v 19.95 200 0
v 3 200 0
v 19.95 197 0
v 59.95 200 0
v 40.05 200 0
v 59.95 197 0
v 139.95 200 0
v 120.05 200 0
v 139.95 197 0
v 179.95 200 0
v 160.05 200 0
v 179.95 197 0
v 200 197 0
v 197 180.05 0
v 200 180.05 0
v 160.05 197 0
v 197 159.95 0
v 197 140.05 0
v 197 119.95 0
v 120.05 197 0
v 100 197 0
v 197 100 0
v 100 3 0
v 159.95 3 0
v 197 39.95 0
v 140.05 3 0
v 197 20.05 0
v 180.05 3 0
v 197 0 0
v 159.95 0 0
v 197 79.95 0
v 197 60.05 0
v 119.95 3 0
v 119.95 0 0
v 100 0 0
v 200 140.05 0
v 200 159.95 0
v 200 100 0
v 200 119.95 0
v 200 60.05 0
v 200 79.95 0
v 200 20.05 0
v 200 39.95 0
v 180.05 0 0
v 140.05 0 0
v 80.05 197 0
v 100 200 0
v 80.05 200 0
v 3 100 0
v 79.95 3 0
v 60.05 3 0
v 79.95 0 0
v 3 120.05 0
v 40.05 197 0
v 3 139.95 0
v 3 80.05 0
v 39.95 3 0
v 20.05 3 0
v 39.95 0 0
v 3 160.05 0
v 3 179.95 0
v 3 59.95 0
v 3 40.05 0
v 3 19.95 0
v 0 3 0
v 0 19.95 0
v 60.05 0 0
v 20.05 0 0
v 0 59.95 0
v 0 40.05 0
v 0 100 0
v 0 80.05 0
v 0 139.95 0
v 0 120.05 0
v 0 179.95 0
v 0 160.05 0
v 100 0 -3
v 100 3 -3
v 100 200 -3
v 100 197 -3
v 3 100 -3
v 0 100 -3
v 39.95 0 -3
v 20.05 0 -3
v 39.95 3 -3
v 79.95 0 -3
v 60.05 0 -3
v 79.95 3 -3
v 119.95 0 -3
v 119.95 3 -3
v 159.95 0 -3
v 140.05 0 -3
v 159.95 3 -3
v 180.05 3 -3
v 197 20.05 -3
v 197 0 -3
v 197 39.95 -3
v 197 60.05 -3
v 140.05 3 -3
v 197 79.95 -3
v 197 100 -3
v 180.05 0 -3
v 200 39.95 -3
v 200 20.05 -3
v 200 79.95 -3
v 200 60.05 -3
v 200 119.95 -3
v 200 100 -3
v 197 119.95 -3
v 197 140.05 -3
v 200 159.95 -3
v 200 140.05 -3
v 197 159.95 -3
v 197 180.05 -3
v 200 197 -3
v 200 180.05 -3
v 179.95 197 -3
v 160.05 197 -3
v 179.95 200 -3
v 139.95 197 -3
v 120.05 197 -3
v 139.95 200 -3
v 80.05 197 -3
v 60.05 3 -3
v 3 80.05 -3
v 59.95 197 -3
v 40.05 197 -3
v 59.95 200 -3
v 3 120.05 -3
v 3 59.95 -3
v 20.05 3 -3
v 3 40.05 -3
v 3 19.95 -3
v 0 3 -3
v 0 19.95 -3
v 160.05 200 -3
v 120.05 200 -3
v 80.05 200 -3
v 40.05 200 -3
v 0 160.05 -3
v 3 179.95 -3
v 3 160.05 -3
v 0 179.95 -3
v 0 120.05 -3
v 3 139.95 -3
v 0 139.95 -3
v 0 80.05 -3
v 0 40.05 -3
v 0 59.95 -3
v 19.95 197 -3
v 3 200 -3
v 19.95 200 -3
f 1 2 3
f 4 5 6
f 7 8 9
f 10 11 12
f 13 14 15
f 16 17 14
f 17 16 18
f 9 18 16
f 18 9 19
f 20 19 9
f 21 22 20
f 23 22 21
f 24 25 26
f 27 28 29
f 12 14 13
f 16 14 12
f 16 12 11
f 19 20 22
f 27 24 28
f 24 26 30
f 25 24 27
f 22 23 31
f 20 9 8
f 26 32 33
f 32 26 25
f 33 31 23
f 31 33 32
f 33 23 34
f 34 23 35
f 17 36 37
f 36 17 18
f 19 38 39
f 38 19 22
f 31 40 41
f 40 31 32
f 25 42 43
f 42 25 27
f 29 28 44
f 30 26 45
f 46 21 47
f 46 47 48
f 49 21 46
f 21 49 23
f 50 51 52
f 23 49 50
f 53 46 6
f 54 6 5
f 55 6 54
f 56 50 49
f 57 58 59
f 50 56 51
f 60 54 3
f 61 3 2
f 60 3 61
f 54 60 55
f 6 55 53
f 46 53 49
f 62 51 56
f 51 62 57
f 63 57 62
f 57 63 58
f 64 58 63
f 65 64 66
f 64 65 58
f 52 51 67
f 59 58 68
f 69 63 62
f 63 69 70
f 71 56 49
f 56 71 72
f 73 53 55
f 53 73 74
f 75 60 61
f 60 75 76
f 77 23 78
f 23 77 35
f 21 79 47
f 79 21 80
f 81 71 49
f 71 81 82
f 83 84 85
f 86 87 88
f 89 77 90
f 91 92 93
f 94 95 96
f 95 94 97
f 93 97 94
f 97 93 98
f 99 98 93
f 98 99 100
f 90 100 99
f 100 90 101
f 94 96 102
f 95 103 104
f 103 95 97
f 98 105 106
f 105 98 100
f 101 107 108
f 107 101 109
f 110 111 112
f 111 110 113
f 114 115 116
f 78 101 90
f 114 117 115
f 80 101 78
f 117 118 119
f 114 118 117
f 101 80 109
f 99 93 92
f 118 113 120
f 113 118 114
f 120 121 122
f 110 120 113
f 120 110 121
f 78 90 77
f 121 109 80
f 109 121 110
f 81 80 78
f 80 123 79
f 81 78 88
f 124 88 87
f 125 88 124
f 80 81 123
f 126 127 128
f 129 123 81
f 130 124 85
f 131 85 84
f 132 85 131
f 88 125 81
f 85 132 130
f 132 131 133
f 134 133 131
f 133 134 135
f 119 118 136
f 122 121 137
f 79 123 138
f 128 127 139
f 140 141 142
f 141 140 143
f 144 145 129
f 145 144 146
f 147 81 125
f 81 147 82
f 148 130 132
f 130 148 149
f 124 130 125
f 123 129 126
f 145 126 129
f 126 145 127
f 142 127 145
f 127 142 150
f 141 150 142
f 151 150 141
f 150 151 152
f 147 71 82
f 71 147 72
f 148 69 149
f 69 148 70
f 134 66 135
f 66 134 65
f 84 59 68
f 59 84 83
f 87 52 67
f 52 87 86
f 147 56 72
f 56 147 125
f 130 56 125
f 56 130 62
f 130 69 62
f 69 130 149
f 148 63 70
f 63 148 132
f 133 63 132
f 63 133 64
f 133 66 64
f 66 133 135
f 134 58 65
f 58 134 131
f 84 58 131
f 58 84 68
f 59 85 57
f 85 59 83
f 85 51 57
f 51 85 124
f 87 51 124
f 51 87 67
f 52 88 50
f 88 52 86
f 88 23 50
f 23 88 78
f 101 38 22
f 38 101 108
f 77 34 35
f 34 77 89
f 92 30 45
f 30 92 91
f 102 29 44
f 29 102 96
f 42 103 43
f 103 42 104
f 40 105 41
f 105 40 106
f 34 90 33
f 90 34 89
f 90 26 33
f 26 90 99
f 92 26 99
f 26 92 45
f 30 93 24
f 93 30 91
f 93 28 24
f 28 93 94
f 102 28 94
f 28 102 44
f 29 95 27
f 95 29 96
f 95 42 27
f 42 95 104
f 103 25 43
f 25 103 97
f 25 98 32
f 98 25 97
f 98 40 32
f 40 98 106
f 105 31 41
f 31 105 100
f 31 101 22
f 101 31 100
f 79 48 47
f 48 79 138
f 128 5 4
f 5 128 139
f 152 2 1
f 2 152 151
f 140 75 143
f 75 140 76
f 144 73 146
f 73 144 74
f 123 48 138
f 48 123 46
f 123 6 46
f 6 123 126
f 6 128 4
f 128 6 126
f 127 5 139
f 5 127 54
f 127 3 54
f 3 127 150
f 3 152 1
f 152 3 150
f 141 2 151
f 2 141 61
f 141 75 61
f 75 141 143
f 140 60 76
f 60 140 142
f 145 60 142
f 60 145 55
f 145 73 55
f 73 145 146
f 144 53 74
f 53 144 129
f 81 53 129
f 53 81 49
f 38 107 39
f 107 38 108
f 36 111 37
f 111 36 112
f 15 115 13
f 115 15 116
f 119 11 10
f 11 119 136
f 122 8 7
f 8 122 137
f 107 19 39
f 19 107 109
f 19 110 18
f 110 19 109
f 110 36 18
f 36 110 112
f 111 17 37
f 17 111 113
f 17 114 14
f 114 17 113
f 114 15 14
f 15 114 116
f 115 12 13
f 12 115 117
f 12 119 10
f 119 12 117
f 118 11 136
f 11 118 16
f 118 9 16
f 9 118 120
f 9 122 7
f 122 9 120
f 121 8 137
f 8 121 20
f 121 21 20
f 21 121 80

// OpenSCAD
model_view = 1;
// 1 == 3d assembled view
// 2 == 2d flat projection for laser cutting
// 3 == 3d parts disasembled

// use model_view = 2, then render (F6),
// then export as e.g. .pdf to get outlines for cutting


// Global variables
material_thickness = 3.00; // material thickness in mm
kerf_thickness = 0.1; // kerf or adjustment to cutouts; this may need to be set differently for different material types or thicknesses
combined_thickness = material_thickness+kerf_thickness; // combined thickness

cube_section_length = 100.00; // mm length of individual cube sections

num_finger_cutouts = 5; //  total connectors per side, use odd numbers

// start modules

sec_len = cube_section_length;

mat_thic = material_thickness;


module finger_cutout(start_index, total_fingers, section_length, thickness, kerf) {
    // Create a 2D finger pattern
    module finger_pattern() {
        for (i = [0 : total_fingers - 1]) {
            if ((i + start_index) % 2 == 0) {
                translate([i * (section_length / total_fingers), 0]) {
                    square([(section_length / total_fingers) + kerf, thickness+kerf], center=false);
                }
            }
        }
    }
    
    // Extrude the 2D pattern to 3D
    linear_extrude(height = thickness + kerf) {
        finger_pattern();
    }
}

module finger_addon(start_index, total_fingers, section_length, thickness, kerf) {
    // Create a 2D finger pattern
    module finger_pattern() {
        for (i = [0 : total_fingers - 1]) {
            if ((i + start_index) % 2 == 0) {
                translate([i * (section_length / total_fingers), 0]) {
                    square([(section_length / total_fingers) -1* kerf, thickness+kerf], center=false);
                }
            }
        }
    }
    
    // Extrude the 2D pattern to 3D
    linear_extrude(height = thickness ) {
        finger_pattern();
    }
}



module flat_section(mat_thic, sec_len, num_finger_cutouts, kerf_thic, color_value, finger_sides) {
    difference() {
        create_colored_square(mat_thic, sec_len, sec_len, color_value);
        
        
                // Calculate the start position to center the fingers
        finger_length = sec_len / num_finger_cutouts;
        start_pos = (sec_len - finger_length * num_finger_cutouts) / 2-kerf_thic/2;
        
        
        

if (finger_sides == 1 || finger_sides == 2 || finger_sides == 3 || finger_sides == 4) {
        // Finger cutouts on one edge
        translate([start_pos, -kerf_thic, -kerf_thic/2]) {
            finger_cutout(0, num_finger_cutouts, sec_len, mat_thic, kerf_thic);
        }
    }

if ( finger_sides == 2 || finger_sides == 3 || finger_sides == 4) {
        // Finger cutouts on the opposite edge
        translate([start_pos, sec_len - mat_thic, -kerf_thic/2]) {
            finger_cutout(0, num_finger_cutouts, sec_len, mat_thic, kerf_thic);
        }
    }

if ( finger_sides == 3 || finger_sides == 4) {
        // Finger cutouts on another edge
        translate([mat_thic, start_pos, -kerf_thic/2]) {
            rotate([0, 0, 90]) {
                finger_cutout(1, num_finger_cutouts, sec_len, mat_thic, kerf_thic);
            }
        }
    }

if (finger_sides == 4) {
        // Finger cutouts on the opposite edge
        translate([sec_len+kerf_thic , start_pos, -kerf_thic/2]) {
            rotate([0, 0, 90]) {
                finger_cutout(1, num_finger_cutouts, sec_len, mat_thic, kerf_thic);
            }
        }
    }
    
    if (finger_sides == 5|| finger_sides == 6|| finger_sides == 7|| finger_sides == 8) {  // alt version of one sided
        // Finger cutouts on the opposite adjacent edge (rotated 90 degrees)
        // Finger cutouts on another edge
        translate([mat_thic, start_pos, -kerf_thic/2]) {
            rotate([0, 0, 90]) {
                finger_cutout(1, num_finger_cutouts, sec_len, mat_thic, kerf_thic);
            }
        }
    }
    
    if (  finger_sides == 6|| finger_sides == 7) { // alt two sided
        // Finger cutouts on the adjacent edge (rotated 90 degrees)
        // Finger cutouts on the opposite edge
        translate([sec_len+kerf_thic , start_pos, -kerf_thic/2]) {
            rotate([0, 0, 90]) {
                finger_cutout(1, num_finger_cutouts, sec_len, mat_thic, kerf_thic);
            }
        }
    }
    
    if ( finger_sides == 7|| finger_sides == 8) { // alt three sides
        // Finger cutouts on the opposite edge
        translate([start_pos, sec_len - mat_thic, -kerf_thic/2]) {
            finger_cutout(0, num_finger_cutouts, sec_len, mat_thic, kerf_thic);
        }
    }
    
    }
}




module single_sec(mat_thic, sec_len, num_finger_cutouts, kerf_thic, color_value) {
    // Bottom face
    flat_section(mat_thic, sec_len, num_finger_cutouts, kerf_thic, color_value,4);
    
    // Top face
    translate([0, 0, sec_len - mat_thic]) {
        flat_section(mat_thic, sec_len, num_finger_cutouts, kerf_thic, color_value,4);
    }
    
    // Front face
    rotate([90, 0, 90]) {
        flat_section(mat_thic, sec_len, num_finger_cutouts, kerf_thic, color_value,4);
    }
    
    // Back face
    rotate([90, 0, 90]) {
        translate([0, 0, sec_len - mat_thic]) {
            flat_section(mat_thic, sec_len, num_finger_cutouts, kerf_thic, color_value,4);
        }
    }
    
    // Left face
    rotate([0, 90, 90]) {
        translate([-sec_len, -sec_len, 0]) {
            flat_section(mat_thic, sec_len, num_finger_cutouts, kerf_thic, color_value,4);
        }
    }
    
    // Right face
    rotate([0, 90, 90]) {
        translate([-sec_len, -sec_len, sec_len - mat_thic]) {
            flat_section(mat_thic, sec_len, num_finger_cutouts, kerf_thic, color_value,4);
        }
    }
}

module create_colored_square(thickness, x, y, color_value) {
    color(color_value, 0.75) {
        create_square(thickness, x, y);
    }
}

module create_square(thickness, x, y) {
        points = [[0,0], [x,0], [x,y], [0,y], [0,0]];
       linear_extrude(height = thickness , center = false)  polygon(points=points);
    
}

module tetris_O_bot(mat_thic, sec_len, num_finger_cutouts, kerf_thic, color_value) {
    // Base
    translate([sec_len*0, sec_len*1, 0])  {
        rotate([0, 180, 180]) {
    flat_section(mat_thic, sec_len, num_finger_cutouts, kerf_thic, color_value,8); }}
    
    // Side 1
        translate([sec_len*1, sec_len*0, 0])  {
    rotate([0, 180, -90]) {
        flat_section(mat_thic, sec_len, num_finger_cutouts, kerf_thic, color_value,8);
    }
}
    
    // Side 2
    translate([sec_len*1 , sec_len*2,0]) {
            rotate([0, 180, 90]) {
        flat_section(mat_thic, sec_len, num_finger_cutouts, kerf_thic, color_value,8);
    }
}
    
    // Top
    translate([sec_len*2 , sec_len*1, 0]) {
        rotate([0, 180, 0]) {
            flat_section(mat_thic, sec_len, num_finger_cutouts, kerf_thic, color_value,8);
        }
    }
}

module tetris_Z_bot(mat_thic, sec_len, num_finger_cutouts, kerf_thic, color_value) {
    // Base
    flat_section(mat_thic, sec_len, num_finger_cutouts, kerf_thic, color_value,3);
    
    // Side 1
        translate([sec_len*1, sec_len*0, 0])  {
    rotate([0, 180, -90]) {
        flat_section(mat_thic, sec_len, num_finger_cutouts, kerf_thic, color_value,8);
    }
}
    
    // Side 2
    translate([sec_len*1 , sec_len,0]) {
            rotate([0, 0, 00]) {
        flat_section(mat_thic, sec_len, num_finger_cutouts, kerf_thic, color_value,8);
    }
}
    
    // Top
    translate([sec_len*2 , sec_len*2, 0]) {
        rotate([0, 0, -90]) {
            flat_section(mat_thic, sec_len, num_finger_cutouts, kerf_thic, color_value,7);
        }
    }
}


module tetris_L_bot(mat_thic, sec_len, num_finger_cutouts, kerf_thic, color_value) {
    // Base
    flat_section(mat_thic, sec_len, num_finger_cutouts, kerf_thic, color_value,3);
    
    // Side 1
        translate([sec_len*2, 0, 0])  {
    rotate([0, 0, 90]) {
        flat_section(mat_thic, sec_len, num_finger_cutouts, kerf_thic, color_value,6);
    }
}
    
    // Side 2
    translate([sec_len*3 , sec_len,0]) {
            rotate([0, 0, 180]) {
        flat_section(mat_thic, sec_len, num_finger_cutouts, kerf_thic, color_value,8);
    }
}
    
    // Top
    translate([sec_len*2 , sec_len*2, 0]) {
        rotate([0, 0, -90]) {
            flat_section(mat_thic, sec_len, num_finger_cutouts, kerf_thic, color_value,3);
        }
    }
}


module tetris_T_bot(mat_thic, sec_len, num_finger_cutouts, kerf_thic, color_value) {
    // Base
    flat_section(mat_thic, sec_len, num_finger_cutouts, kerf_thic, color_value,3);
    
    // Side 1
        translate([sec_len*2, 0, 0])  {
    rotate([0, 0, 90]) {
        flat_section(mat_thic, sec_len, num_finger_cutouts, kerf_thic, color_value,5);
    }
}
    
    // Side 2
    translate([sec_len*3 , sec_len,0]) {
            rotate([0, 0, 180]) {
        flat_section(mat_thic, sec_len, num_finger_cutouts, kerf_thic, color_value,3);
    }
}
    
    // Top
    translate([sec_len , sec_len, 0]) {
        rotate([0, 0, 0]) {
            flat_section(mat_thic, sec_len, num_finger_cutouts, kerf_thic, color_value,7);
        }
    }
}

module tetris_3_side(mat_thic, sec_len, num_finger_cutouts, kerf_thic, color_value) {
    // Base
            translate([sec_len, 0, 0])  {
    rotate([0, 0, 90]) {
    flat_section(mat_thic, sec_len, num_finger_cutouts, kerf_thic, color_value,7);
            }
}
    
    // Side 1
        translate([sec_len*2, sec_len+3, 0])  {
    rotate([0, 0, 180]) {
        flat_section(mat_thic, sec_len, num_finger_cutouts, kerf_thic, color_value,2);
    }
}
    
    // Side 2
    translate([sec_len*2 , sec_len+3,0]) {
            rotate([0, 0, -90]) {
        flat_section(mat_thic, sec_len, num_finger_cutouts, kerf_thic, color_value,7);
    }
}
    

}

module tetris_o(){
    tetris_O_bot(mat_thic, sec_len, num_finger_cutouts, kerf_thickness, "yellow");
    
    }

module tetris_z(){
    tetris_Z_bot(mat_thic, sec_len, num_finger_cutouts, kerf_thickness, "green");
    
    }

module tetris_l(){
    tetris_L_bot(mat_thic, sec_len, num_finger_cutouts, kerf_thickness, "orange");
    
    }


module tetris_t(){
    tetris_T_bot(mat_thic, sec_len, num_finger_cutouts, kerf_thickness, "blue");
    translate([0, 0,mat_thic*2]) {
  rotate([-90, 0, 0]) {
tetris_3_side(mat_thic, sec_len, num_finger_cutouts, kerf_thickness, "purple");
  }
  }
  
  
              translate([sec_len*3, 0, mat_thic])  {
    rotate([-90, 0, 90]) {
    flat_section(mat_thic, sec_len, num_finger_cutouts, kerf_thickness, "green",4);    }}
    
    
                  translate([mat_thic, 0, mat_thic])  {
    rotate([-90, 0, 90]) {
    flat_section(mat_thic, sec_len, num_finger_cutouts, kerf_thickness, "green",4);    }}
    
                   translate([sec_len*2, sec_len*2-mat_thic, mat_thic])  {
    rotate([0, 90, 90]) {
    flat_section(mat_thic, sec_len, num_finger_cutouts, kerf_thickness, "red",4);    }}
    
    
        //corner sides 
    
     translate([sec_len, sec_len-mat_thic, mat_thic])  {
    rotate([-90, 90, 0]) {
        corner_side_2();
     }}
     
          translate([sec_len*2, sec_len, mat_thic])  {
    rotate([90, 90, 0]) {
        corner_side_2();
     }}
     
    

    
    
    //corner sides 90 degree
    
     translate([sec_len+mat_thic, sec_len*2, -sec_len+mat_thic])  {
    rotate([-90, 180, 90]) { 
      corner_side_1();  }}
      
           translate([sec_len*2, sec_len*2, -sec_len+mat_thic])  {
    rotate([-90, 180, 90]) { 
      corner_side_1();  }}
    
    
    
}


module corner_side_1(){
                    // Calculate the start position to center the fingers
        finger_length = sec_len / num_finger_cutouts;
        start_pos = (sec_len - finger_length * num_finger_cutouts) / 2-kerf_thickness/2;
    
     difference(){
    union(){

         translate([sec_len+mat_thic,-start_pos, 0]){
        rotate([0, 0, 90]){
        finger_addon(0, num_finger_cutouts, sec_len, mat_thic, +1*kerf_thickness);}}
    flat_section(mat_thic, sec_len, num_finger_cutouts, kerf_thickness, "yellow",3);    }
    
    rotate([-90, 0, 0]){
    translate([sec_len-0*kerf_thickness,-mat_thic-mat_thic/2, sec_len-mat_thic]){
    cube([combined_thickness*2,combined_thickness*2,combined_thickness*2]);
    }
        translate([sec_len-kerf_thickness,-mat_thic-mat_thic/2, -kerf_thickness])
    cube([combined_thickness*2,combined_thickness*2,combined_thickness]);
    }
    }   
    }
    
    
module corner_side_2(){
    
                        // Calculate the start position to center the fingers
        finger_length = sec_len / num_finger_cutouts;
        start_pos = (sec_len - finger_length * num_finger_cutouts) / 2-kerf_thickness/2;
    
       union(){
        translate([-start_pos,-mat_thic, 0]){
        finger_addon(1, num_finger_cutouts, sec_len, mat_thic, +1*kerf_thickness);}
    flat_section(mat_thic, sec_len, num_finger_cutouts, kerf_thickness, "red",7);    }
    
    }

// end modules

// start render parts

//flat_section(mat_thic, sec_len, num_finger_cutouts, kerf_thickness, "pink",7);
//    flat_section2(mat_thic, sec_len, num_finger_cutouts, kerf_thickness, "pink");

//single_sec(mat_thic, sec_len, num_finger_cutouts, kerf_thickness, "pink");
//projection(cut = false) {


//tetris_t();
    tetris_o();

  //tetris_L_bot(mat_thic, sec_len, num_finger_cutouts, kerf_thickness, "blue");

//}
